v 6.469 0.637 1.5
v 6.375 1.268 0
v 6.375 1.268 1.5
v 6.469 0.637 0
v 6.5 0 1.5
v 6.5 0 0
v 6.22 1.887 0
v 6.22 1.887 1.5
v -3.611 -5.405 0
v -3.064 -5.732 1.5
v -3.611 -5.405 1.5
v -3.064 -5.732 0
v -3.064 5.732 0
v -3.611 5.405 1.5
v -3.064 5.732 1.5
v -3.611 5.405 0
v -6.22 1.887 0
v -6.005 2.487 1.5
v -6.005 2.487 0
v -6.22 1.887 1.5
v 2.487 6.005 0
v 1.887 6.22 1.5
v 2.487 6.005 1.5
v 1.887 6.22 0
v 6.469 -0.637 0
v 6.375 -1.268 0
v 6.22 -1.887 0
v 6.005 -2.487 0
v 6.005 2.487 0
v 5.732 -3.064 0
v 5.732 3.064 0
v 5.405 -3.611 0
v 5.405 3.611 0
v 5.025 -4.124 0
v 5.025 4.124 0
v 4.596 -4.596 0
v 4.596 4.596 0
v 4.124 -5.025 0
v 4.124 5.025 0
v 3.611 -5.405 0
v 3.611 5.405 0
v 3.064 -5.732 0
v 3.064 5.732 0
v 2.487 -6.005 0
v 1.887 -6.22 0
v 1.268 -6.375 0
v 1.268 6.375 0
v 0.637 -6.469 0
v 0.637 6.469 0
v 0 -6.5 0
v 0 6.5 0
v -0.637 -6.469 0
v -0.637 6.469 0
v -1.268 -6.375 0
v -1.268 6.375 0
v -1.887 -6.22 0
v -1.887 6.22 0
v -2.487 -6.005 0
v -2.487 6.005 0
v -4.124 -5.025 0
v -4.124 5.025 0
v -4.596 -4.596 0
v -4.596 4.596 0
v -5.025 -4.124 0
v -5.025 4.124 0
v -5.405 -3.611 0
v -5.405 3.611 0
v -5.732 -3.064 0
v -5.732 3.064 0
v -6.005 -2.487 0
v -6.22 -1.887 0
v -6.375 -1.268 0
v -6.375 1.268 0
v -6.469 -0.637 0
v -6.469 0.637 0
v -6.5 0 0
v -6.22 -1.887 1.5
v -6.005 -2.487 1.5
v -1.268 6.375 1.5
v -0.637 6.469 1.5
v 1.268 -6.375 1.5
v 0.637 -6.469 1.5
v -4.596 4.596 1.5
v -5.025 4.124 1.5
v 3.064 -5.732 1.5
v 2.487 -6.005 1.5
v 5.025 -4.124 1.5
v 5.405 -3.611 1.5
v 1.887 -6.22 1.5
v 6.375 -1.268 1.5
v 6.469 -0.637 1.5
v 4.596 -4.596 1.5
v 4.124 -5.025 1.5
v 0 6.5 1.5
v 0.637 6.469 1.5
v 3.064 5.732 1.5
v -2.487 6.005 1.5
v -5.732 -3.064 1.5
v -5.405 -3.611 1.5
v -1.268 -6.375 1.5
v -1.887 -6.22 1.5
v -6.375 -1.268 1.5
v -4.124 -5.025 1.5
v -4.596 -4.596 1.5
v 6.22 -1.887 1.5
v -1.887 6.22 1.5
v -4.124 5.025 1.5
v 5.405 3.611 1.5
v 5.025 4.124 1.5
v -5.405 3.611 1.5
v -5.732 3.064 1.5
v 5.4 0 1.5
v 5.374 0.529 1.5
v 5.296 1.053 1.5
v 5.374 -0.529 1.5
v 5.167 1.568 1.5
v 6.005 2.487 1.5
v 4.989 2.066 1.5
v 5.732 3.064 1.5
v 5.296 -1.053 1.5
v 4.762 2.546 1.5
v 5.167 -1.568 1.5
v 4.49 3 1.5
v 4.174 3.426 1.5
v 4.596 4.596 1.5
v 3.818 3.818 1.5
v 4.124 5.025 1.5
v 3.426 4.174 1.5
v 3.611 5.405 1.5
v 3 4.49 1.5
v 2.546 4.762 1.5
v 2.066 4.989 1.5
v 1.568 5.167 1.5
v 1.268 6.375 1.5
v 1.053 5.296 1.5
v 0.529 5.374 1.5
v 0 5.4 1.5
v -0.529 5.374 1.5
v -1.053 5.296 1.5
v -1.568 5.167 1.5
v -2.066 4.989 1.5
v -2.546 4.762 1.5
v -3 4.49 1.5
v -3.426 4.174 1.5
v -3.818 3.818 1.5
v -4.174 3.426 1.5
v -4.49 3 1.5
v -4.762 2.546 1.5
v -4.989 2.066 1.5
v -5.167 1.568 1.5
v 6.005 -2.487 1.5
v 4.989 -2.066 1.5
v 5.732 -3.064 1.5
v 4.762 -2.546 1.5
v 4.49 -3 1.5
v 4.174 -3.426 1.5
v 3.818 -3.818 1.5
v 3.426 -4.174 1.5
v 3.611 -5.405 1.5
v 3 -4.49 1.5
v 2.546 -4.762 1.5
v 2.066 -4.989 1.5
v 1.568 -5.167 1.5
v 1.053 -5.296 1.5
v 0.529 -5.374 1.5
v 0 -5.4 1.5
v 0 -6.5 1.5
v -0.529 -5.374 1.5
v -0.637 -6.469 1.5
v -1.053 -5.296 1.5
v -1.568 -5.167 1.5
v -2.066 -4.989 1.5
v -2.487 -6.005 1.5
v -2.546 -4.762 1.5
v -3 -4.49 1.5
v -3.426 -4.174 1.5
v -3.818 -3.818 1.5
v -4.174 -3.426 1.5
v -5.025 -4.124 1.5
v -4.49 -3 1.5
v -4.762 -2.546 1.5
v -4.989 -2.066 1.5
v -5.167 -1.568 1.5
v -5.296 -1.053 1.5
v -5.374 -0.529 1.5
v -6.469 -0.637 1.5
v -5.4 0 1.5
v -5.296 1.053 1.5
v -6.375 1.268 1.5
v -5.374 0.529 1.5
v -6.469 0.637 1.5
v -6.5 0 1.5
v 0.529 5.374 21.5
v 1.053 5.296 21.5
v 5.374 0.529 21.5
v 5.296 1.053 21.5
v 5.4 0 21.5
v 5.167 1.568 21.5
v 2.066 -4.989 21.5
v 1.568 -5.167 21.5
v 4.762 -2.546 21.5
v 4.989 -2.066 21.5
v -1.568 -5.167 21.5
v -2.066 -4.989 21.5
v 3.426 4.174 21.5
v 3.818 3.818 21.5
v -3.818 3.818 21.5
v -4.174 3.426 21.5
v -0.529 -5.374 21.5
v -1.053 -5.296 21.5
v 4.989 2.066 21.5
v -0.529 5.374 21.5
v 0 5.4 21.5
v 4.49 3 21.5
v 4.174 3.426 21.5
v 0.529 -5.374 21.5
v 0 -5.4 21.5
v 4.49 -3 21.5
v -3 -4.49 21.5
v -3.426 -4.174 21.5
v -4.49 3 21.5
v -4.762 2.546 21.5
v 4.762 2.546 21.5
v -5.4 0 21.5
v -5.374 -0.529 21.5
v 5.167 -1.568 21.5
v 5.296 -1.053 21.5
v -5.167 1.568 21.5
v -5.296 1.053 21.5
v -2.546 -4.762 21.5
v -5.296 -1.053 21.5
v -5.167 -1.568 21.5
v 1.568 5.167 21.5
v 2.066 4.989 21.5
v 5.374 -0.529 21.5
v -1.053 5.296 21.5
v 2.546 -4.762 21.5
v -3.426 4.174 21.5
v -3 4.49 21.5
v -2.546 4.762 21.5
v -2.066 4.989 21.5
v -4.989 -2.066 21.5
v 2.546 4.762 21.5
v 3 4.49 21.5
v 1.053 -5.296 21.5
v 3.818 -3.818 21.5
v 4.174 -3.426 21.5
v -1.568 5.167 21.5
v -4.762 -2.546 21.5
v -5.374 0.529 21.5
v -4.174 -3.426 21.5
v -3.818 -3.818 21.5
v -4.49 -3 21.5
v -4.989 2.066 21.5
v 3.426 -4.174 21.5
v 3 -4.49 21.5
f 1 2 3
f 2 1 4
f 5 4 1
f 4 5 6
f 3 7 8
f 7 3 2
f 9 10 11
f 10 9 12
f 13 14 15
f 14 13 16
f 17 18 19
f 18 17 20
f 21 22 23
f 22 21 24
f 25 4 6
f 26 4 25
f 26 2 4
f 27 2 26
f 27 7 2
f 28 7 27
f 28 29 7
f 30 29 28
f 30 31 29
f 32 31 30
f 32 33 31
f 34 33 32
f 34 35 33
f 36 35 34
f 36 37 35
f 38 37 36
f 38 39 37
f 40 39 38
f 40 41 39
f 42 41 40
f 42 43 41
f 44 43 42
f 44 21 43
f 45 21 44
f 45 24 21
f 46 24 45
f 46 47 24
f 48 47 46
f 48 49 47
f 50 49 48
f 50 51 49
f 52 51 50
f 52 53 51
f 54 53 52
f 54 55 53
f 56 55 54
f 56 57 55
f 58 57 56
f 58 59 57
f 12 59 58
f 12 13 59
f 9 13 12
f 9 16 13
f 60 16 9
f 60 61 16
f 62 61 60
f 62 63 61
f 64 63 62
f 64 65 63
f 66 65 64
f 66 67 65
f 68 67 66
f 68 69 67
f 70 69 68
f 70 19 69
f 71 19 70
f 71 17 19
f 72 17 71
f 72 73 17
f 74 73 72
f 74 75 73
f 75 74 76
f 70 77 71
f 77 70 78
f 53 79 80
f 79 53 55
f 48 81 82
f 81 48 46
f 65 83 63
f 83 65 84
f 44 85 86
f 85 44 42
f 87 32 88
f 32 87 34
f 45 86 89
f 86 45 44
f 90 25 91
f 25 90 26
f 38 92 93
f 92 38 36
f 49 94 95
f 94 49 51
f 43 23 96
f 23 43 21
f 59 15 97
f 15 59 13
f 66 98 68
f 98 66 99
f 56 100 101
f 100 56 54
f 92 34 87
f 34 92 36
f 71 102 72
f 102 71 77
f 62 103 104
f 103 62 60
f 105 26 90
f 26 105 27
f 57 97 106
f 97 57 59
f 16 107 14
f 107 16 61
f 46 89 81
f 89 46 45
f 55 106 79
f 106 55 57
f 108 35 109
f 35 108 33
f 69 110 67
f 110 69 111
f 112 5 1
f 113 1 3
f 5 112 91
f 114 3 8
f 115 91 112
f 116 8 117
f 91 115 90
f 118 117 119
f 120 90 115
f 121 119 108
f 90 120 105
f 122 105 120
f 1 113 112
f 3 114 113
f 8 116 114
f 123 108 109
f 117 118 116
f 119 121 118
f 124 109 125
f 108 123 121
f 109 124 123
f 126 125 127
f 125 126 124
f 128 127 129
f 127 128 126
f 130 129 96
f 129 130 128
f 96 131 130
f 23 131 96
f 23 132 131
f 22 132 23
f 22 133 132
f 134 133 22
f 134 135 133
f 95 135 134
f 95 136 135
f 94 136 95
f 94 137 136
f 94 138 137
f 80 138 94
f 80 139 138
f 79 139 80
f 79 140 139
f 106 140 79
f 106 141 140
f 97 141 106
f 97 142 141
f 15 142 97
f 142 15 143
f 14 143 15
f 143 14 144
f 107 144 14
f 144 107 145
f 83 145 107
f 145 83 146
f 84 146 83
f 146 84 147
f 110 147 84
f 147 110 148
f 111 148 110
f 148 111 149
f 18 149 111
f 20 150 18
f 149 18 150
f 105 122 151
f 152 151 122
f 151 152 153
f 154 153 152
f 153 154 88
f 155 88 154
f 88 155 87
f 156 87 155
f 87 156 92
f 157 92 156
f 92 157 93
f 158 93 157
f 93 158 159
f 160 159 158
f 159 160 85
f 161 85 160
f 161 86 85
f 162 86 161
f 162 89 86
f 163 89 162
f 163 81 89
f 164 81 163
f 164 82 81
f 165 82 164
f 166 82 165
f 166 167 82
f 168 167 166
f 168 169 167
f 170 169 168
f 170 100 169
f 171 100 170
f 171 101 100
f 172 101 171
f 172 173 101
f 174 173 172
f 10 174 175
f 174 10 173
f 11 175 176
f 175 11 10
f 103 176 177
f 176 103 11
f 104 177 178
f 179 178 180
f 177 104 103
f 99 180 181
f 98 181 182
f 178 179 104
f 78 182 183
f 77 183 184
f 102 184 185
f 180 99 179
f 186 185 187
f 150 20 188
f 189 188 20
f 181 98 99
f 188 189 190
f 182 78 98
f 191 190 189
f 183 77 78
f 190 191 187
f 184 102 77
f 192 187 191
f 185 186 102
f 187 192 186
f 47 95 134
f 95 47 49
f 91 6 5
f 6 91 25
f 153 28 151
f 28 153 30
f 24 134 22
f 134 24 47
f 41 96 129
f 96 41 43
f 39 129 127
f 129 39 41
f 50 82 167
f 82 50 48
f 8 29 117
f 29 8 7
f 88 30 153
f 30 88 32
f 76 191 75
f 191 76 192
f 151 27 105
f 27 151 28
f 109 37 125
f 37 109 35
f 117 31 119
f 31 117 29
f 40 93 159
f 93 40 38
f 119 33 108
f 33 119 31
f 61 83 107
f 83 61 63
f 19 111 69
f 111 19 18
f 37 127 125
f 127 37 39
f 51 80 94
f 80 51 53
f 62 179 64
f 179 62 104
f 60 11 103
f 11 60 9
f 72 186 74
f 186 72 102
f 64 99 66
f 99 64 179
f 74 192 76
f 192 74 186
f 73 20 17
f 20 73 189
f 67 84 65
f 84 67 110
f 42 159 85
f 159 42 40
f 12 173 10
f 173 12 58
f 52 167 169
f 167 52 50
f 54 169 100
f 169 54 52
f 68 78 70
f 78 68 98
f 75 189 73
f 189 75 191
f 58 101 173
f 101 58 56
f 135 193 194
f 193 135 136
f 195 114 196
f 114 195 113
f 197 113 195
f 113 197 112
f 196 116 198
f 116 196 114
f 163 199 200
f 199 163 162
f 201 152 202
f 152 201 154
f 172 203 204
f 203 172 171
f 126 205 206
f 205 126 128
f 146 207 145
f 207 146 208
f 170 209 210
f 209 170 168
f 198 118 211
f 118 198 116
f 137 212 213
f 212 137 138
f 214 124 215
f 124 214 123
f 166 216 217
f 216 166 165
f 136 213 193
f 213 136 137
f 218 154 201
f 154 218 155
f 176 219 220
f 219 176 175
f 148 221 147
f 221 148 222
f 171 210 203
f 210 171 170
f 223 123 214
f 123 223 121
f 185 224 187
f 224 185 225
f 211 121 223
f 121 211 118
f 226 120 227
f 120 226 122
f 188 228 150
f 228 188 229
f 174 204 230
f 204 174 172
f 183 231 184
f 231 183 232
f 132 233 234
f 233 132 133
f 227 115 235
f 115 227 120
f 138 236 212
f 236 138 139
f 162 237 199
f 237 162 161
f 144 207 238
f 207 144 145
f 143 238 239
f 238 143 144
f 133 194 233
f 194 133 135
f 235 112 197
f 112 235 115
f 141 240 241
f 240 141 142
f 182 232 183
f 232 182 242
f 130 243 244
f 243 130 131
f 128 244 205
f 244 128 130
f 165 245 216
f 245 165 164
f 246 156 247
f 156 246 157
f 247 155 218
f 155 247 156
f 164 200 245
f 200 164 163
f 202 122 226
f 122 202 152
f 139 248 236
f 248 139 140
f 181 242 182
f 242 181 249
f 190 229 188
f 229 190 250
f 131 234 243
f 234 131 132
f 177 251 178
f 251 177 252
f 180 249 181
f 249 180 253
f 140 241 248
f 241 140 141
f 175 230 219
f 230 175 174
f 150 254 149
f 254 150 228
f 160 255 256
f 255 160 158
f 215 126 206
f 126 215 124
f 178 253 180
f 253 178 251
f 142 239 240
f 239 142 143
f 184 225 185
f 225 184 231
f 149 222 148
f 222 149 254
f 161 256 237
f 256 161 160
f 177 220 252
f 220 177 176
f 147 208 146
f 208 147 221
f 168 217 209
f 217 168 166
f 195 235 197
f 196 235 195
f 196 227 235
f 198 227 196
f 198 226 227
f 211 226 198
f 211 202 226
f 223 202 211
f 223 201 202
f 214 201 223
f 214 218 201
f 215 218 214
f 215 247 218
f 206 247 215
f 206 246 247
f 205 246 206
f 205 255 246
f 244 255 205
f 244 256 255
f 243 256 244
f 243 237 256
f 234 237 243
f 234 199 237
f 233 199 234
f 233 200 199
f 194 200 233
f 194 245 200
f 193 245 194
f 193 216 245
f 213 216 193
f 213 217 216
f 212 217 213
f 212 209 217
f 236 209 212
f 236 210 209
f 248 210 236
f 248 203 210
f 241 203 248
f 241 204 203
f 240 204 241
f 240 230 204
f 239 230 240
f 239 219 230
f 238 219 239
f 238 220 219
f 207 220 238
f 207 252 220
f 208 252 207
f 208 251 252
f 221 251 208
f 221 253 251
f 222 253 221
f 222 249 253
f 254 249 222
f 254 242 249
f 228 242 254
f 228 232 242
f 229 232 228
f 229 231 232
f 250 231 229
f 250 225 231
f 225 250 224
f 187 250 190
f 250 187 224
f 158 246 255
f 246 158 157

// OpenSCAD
// Adapter sleeve: 0.2 mL PCR tube into a 1.5 mL tube rack hole
// Print orientation: collar (13 mm dia, 1.5 mm thick) on the bed (z = 0..1.5),
// sleeve body (10.8 mm OD) rising to z = 21.5, with a 6.2 mm bore through the full height.

// --- Dimensions (mm) ---
collar_dia   = 13.0;   // outer diameter of the bed-lying collar
collar_thk   = 1.5;    // thickness of the collar (z = 0 to 1.5)
body_od      = 10.8;   // outer diameter of the sleeve body
body_top_z   = 21.5;   // top of the sleeve body (z = 21.5)
bore_dia     = 6.2;    // straight through-bore diameter

// --- Derived radii ---
collar_r = collar_dia / 2;   // 6.5
body_r   = body_od   / 2;    // 5.4
bore_r   = bore_dia  / 2;    // 3.1

// --- Curvature resolution ---
$fn = 64;

// --- Build the solid, centred on the origin in X and Y, resting on z = 0 ---
union() {
    // Collar: 13 mm diameter, 1.5 mm thick, lying on the bed
    cylinder(h = collar_thk, d = collar_dia, $fn = $fn);

    // Sleeve body: 10.8 mm outer diameter, rising from the collar to z = 21.5
    cylinder(h = body_top_z, d = body_od, $fn = $fn);
}

// --- Cut the straight 6.2 mm bore through the full height ---
// The cutter extends 1 mm past each face (z = -1 to 22.5) so no faces are coplanar.
difference() {
    union() {
        cylinder(h = collar_thk, d = collar_dia, $fn = $fn);
        cylinder(h = body_top_z, d = body_od,   $fn = $fn);
    }
    translate([0, 0, -1])
        cylinder(h = body_top_z + 2, d = bore_dia, $fn = $fn);
}
